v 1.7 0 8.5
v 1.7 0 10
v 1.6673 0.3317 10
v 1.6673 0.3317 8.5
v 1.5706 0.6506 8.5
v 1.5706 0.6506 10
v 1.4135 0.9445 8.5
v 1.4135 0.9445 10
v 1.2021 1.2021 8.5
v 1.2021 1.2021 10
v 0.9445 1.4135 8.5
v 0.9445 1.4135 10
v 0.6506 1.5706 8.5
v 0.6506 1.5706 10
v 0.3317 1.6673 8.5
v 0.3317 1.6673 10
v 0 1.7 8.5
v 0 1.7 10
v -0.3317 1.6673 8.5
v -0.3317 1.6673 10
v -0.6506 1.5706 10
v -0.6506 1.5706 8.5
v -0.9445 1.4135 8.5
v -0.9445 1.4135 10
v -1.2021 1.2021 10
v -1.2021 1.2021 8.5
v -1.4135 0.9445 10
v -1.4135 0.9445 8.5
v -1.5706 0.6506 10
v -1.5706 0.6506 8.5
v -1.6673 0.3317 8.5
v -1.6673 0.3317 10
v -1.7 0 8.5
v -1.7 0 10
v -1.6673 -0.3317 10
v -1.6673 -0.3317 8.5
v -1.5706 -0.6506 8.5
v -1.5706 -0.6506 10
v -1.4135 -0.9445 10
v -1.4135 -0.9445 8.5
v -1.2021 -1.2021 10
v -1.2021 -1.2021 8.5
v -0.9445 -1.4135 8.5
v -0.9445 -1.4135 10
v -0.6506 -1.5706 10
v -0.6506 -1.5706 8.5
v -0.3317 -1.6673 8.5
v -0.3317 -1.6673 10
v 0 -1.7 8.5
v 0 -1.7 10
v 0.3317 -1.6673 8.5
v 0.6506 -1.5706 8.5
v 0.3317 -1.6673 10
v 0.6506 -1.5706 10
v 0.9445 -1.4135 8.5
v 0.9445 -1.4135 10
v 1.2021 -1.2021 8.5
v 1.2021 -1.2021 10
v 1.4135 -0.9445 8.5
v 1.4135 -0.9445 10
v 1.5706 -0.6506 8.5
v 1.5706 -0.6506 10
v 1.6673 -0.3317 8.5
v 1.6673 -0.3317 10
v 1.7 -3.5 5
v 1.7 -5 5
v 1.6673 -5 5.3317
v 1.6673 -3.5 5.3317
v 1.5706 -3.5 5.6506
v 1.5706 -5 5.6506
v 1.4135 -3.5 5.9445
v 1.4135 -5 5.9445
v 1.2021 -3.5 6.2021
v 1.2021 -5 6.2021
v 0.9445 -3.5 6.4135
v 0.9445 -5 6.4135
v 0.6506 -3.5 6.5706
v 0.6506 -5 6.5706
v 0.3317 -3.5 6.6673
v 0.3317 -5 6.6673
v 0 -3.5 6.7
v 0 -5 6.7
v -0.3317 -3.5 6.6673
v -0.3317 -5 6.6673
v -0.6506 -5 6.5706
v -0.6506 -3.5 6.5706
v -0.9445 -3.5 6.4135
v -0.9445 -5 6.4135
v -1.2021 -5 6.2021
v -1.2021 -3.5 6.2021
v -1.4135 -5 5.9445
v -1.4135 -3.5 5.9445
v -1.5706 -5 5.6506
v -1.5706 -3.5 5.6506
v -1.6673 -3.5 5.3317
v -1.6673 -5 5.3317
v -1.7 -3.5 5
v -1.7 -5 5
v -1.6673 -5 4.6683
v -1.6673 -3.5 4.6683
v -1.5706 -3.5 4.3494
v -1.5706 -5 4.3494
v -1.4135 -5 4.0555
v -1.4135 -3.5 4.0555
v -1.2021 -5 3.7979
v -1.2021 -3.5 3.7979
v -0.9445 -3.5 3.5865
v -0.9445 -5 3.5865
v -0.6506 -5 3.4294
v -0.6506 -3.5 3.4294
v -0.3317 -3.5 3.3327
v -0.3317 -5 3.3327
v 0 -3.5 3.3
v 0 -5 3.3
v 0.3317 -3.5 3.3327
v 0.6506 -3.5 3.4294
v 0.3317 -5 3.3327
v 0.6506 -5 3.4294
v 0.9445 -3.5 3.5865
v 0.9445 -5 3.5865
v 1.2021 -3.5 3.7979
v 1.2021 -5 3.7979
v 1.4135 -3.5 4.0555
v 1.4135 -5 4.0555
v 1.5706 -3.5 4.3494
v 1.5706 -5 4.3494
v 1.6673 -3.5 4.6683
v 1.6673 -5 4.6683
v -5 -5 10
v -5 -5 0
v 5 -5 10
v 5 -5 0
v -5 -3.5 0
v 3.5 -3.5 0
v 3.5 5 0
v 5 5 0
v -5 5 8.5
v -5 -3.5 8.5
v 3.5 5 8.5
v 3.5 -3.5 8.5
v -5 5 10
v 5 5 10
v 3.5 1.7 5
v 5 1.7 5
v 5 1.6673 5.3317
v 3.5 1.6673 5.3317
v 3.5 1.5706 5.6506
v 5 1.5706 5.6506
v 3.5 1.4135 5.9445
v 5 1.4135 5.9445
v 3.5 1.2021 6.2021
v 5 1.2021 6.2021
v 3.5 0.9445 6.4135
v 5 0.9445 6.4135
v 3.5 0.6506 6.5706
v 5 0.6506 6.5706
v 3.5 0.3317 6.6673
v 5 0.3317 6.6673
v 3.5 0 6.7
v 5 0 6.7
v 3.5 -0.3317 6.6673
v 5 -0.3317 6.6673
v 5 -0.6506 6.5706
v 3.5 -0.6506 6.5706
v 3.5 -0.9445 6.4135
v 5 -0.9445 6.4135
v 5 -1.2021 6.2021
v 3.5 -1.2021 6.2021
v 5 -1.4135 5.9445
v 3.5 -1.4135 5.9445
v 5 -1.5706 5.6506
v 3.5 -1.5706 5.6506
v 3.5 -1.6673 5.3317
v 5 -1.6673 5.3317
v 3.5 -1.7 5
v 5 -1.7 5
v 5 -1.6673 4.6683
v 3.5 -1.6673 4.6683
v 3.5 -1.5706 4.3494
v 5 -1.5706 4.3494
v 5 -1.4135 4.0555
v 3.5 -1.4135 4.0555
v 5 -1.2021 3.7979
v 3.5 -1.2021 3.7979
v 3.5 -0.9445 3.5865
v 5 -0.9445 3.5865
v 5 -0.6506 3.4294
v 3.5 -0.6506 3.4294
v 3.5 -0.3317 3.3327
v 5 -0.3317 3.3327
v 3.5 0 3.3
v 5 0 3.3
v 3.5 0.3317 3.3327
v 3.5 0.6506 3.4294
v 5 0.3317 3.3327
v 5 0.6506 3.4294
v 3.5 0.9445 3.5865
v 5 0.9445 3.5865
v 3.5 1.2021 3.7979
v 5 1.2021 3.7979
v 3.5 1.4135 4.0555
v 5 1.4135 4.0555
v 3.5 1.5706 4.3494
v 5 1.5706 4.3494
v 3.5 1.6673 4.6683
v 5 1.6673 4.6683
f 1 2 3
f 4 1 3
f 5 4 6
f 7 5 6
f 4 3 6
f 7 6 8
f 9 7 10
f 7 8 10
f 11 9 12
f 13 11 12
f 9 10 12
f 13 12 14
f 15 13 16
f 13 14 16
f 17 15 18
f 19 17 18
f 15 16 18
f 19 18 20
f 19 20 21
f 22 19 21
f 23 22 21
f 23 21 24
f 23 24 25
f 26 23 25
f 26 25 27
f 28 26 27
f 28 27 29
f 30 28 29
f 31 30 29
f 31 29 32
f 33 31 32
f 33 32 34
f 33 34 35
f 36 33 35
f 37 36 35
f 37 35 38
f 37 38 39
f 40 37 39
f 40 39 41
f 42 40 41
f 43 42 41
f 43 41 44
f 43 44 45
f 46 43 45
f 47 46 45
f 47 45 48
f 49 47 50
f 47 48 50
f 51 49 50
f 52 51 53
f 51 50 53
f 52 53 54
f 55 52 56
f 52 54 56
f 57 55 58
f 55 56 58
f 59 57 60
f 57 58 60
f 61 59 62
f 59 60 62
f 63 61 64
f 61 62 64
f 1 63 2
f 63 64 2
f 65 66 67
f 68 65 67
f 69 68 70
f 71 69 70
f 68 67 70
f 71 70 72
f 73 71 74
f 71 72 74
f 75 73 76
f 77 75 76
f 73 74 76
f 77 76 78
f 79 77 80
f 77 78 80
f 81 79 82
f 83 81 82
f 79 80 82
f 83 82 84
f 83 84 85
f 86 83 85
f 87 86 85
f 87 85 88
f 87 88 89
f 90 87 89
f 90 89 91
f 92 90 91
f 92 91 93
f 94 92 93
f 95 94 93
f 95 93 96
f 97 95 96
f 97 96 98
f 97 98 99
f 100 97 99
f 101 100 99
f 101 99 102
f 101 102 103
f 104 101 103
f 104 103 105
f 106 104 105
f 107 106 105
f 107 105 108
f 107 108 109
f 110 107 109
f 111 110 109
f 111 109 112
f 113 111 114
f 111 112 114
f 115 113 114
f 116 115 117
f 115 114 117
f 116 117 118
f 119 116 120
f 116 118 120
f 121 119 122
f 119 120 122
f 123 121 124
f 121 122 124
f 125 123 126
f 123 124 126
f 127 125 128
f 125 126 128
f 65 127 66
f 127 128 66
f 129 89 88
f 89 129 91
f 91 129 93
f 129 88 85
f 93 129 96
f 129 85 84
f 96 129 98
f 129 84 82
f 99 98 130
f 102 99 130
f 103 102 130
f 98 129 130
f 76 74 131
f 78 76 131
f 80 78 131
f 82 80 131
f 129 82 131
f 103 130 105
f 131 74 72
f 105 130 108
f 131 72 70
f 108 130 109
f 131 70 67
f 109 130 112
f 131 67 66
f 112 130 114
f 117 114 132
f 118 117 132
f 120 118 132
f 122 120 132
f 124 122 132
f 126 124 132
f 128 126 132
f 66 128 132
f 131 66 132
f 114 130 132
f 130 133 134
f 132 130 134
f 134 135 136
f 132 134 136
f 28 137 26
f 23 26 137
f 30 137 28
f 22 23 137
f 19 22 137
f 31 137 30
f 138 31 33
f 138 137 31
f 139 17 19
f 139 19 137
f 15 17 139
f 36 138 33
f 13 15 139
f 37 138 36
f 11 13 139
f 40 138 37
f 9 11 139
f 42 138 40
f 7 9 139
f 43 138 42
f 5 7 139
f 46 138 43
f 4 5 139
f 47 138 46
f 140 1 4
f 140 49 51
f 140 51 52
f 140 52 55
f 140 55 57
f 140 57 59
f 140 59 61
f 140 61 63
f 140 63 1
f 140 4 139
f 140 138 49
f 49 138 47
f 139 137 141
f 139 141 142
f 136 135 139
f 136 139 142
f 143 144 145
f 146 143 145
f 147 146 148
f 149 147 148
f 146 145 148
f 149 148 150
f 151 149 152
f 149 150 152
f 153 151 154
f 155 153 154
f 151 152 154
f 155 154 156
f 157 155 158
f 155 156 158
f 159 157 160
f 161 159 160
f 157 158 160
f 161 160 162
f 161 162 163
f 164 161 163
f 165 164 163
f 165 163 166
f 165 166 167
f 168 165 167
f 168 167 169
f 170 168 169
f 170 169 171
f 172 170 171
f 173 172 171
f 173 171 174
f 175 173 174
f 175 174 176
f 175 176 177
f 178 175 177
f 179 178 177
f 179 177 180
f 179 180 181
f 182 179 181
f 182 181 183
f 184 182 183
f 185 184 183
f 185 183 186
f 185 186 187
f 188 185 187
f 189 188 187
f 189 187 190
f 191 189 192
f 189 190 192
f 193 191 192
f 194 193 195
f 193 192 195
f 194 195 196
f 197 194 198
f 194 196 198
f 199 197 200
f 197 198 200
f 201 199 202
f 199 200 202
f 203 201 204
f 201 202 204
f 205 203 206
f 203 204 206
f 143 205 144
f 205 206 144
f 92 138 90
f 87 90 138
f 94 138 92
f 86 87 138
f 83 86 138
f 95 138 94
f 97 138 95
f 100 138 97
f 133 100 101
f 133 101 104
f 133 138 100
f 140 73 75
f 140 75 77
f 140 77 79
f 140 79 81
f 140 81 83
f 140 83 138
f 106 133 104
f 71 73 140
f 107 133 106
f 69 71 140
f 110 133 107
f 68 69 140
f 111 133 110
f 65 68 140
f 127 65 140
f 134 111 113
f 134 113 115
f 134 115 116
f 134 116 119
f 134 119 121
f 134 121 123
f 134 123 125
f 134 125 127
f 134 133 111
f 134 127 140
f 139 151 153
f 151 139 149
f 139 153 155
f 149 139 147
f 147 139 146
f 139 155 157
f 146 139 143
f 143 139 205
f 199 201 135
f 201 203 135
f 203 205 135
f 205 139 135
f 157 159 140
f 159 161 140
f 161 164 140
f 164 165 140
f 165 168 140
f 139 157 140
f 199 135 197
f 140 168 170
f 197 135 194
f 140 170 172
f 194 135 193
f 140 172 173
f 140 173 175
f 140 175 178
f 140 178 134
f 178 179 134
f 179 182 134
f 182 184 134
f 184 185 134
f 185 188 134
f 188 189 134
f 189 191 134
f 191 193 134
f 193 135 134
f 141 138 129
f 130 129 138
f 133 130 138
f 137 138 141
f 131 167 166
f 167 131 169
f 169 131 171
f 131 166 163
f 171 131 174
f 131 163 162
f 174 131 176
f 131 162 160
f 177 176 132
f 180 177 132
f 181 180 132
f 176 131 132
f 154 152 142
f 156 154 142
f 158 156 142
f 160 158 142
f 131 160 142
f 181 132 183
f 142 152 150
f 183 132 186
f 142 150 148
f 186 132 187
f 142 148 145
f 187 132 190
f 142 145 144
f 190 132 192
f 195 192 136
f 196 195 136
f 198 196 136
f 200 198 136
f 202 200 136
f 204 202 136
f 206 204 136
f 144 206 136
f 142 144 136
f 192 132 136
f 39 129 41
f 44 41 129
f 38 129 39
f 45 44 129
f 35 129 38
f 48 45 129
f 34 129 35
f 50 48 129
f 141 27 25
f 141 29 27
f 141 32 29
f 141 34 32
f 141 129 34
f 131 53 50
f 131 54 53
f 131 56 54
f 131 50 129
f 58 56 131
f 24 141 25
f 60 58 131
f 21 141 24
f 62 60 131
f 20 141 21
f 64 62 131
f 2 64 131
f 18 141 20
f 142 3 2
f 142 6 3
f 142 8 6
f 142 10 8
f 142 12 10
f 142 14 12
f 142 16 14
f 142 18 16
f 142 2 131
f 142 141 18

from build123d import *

# Parameters (mm, degrees)
F0_W     = 10
F0_H     = 10
F1_DEPTH = 10
F2_W     = 8.5
F2_H     = 8.5
F3_DEPTH = 8.5
F4_R     = 1.7
F5_DEPTH = 25
F6_R     = 1.7
F7_DEPTH = 25
F8_R     = 1.7
F9_DEPTH = 25


with BuildPart() as f1:
    # F0 (on Top) → F1 (new body)
    with BuildSketch(Plane.XY):
        Rectangle(F0_W, F0_H)
    extrude(amount=F1_DEPTH)

    # F2 (on face) → F3 (cut)
    with BuildSketch(Plane(origin=(0, 0, 0), x_dir=(1, 0, 0), z_dir=(0, 0, -1))):
        with Locations((-0.75, -0.75)):
            Rectangle(F2_W, F2_H)
    extrude(amount=-F3_DEPTH, mode=Mode.SUBTRACT)

    # F4 (on face) → F5 (cut)
    with BuildSketch(Plane.YZ.offset(5)):
        with Locations((0, 5)):
            Circle(F4_R)
    extrude(amount=-F5_DEPTH, mode=Mode.SUBTRACT)

    # F6 (on face) → F7 (cut)
    with BuildSketch(Plane.XY.offset(10)):
        Circle(F6_R)
    extrude(amount=-F7_DEPTH, mode=Mode.SUBTRACT)

    # F8 (on face) → F9 (cut)
    with BuildSketch(Plane.XZ.offset(5)):
        with Locations((0, 5)):
            Circle(F8_R)
    extrude(amount=-F9_DEPTH, mode=Mode.SUBTRACT)


solid = f1.part
